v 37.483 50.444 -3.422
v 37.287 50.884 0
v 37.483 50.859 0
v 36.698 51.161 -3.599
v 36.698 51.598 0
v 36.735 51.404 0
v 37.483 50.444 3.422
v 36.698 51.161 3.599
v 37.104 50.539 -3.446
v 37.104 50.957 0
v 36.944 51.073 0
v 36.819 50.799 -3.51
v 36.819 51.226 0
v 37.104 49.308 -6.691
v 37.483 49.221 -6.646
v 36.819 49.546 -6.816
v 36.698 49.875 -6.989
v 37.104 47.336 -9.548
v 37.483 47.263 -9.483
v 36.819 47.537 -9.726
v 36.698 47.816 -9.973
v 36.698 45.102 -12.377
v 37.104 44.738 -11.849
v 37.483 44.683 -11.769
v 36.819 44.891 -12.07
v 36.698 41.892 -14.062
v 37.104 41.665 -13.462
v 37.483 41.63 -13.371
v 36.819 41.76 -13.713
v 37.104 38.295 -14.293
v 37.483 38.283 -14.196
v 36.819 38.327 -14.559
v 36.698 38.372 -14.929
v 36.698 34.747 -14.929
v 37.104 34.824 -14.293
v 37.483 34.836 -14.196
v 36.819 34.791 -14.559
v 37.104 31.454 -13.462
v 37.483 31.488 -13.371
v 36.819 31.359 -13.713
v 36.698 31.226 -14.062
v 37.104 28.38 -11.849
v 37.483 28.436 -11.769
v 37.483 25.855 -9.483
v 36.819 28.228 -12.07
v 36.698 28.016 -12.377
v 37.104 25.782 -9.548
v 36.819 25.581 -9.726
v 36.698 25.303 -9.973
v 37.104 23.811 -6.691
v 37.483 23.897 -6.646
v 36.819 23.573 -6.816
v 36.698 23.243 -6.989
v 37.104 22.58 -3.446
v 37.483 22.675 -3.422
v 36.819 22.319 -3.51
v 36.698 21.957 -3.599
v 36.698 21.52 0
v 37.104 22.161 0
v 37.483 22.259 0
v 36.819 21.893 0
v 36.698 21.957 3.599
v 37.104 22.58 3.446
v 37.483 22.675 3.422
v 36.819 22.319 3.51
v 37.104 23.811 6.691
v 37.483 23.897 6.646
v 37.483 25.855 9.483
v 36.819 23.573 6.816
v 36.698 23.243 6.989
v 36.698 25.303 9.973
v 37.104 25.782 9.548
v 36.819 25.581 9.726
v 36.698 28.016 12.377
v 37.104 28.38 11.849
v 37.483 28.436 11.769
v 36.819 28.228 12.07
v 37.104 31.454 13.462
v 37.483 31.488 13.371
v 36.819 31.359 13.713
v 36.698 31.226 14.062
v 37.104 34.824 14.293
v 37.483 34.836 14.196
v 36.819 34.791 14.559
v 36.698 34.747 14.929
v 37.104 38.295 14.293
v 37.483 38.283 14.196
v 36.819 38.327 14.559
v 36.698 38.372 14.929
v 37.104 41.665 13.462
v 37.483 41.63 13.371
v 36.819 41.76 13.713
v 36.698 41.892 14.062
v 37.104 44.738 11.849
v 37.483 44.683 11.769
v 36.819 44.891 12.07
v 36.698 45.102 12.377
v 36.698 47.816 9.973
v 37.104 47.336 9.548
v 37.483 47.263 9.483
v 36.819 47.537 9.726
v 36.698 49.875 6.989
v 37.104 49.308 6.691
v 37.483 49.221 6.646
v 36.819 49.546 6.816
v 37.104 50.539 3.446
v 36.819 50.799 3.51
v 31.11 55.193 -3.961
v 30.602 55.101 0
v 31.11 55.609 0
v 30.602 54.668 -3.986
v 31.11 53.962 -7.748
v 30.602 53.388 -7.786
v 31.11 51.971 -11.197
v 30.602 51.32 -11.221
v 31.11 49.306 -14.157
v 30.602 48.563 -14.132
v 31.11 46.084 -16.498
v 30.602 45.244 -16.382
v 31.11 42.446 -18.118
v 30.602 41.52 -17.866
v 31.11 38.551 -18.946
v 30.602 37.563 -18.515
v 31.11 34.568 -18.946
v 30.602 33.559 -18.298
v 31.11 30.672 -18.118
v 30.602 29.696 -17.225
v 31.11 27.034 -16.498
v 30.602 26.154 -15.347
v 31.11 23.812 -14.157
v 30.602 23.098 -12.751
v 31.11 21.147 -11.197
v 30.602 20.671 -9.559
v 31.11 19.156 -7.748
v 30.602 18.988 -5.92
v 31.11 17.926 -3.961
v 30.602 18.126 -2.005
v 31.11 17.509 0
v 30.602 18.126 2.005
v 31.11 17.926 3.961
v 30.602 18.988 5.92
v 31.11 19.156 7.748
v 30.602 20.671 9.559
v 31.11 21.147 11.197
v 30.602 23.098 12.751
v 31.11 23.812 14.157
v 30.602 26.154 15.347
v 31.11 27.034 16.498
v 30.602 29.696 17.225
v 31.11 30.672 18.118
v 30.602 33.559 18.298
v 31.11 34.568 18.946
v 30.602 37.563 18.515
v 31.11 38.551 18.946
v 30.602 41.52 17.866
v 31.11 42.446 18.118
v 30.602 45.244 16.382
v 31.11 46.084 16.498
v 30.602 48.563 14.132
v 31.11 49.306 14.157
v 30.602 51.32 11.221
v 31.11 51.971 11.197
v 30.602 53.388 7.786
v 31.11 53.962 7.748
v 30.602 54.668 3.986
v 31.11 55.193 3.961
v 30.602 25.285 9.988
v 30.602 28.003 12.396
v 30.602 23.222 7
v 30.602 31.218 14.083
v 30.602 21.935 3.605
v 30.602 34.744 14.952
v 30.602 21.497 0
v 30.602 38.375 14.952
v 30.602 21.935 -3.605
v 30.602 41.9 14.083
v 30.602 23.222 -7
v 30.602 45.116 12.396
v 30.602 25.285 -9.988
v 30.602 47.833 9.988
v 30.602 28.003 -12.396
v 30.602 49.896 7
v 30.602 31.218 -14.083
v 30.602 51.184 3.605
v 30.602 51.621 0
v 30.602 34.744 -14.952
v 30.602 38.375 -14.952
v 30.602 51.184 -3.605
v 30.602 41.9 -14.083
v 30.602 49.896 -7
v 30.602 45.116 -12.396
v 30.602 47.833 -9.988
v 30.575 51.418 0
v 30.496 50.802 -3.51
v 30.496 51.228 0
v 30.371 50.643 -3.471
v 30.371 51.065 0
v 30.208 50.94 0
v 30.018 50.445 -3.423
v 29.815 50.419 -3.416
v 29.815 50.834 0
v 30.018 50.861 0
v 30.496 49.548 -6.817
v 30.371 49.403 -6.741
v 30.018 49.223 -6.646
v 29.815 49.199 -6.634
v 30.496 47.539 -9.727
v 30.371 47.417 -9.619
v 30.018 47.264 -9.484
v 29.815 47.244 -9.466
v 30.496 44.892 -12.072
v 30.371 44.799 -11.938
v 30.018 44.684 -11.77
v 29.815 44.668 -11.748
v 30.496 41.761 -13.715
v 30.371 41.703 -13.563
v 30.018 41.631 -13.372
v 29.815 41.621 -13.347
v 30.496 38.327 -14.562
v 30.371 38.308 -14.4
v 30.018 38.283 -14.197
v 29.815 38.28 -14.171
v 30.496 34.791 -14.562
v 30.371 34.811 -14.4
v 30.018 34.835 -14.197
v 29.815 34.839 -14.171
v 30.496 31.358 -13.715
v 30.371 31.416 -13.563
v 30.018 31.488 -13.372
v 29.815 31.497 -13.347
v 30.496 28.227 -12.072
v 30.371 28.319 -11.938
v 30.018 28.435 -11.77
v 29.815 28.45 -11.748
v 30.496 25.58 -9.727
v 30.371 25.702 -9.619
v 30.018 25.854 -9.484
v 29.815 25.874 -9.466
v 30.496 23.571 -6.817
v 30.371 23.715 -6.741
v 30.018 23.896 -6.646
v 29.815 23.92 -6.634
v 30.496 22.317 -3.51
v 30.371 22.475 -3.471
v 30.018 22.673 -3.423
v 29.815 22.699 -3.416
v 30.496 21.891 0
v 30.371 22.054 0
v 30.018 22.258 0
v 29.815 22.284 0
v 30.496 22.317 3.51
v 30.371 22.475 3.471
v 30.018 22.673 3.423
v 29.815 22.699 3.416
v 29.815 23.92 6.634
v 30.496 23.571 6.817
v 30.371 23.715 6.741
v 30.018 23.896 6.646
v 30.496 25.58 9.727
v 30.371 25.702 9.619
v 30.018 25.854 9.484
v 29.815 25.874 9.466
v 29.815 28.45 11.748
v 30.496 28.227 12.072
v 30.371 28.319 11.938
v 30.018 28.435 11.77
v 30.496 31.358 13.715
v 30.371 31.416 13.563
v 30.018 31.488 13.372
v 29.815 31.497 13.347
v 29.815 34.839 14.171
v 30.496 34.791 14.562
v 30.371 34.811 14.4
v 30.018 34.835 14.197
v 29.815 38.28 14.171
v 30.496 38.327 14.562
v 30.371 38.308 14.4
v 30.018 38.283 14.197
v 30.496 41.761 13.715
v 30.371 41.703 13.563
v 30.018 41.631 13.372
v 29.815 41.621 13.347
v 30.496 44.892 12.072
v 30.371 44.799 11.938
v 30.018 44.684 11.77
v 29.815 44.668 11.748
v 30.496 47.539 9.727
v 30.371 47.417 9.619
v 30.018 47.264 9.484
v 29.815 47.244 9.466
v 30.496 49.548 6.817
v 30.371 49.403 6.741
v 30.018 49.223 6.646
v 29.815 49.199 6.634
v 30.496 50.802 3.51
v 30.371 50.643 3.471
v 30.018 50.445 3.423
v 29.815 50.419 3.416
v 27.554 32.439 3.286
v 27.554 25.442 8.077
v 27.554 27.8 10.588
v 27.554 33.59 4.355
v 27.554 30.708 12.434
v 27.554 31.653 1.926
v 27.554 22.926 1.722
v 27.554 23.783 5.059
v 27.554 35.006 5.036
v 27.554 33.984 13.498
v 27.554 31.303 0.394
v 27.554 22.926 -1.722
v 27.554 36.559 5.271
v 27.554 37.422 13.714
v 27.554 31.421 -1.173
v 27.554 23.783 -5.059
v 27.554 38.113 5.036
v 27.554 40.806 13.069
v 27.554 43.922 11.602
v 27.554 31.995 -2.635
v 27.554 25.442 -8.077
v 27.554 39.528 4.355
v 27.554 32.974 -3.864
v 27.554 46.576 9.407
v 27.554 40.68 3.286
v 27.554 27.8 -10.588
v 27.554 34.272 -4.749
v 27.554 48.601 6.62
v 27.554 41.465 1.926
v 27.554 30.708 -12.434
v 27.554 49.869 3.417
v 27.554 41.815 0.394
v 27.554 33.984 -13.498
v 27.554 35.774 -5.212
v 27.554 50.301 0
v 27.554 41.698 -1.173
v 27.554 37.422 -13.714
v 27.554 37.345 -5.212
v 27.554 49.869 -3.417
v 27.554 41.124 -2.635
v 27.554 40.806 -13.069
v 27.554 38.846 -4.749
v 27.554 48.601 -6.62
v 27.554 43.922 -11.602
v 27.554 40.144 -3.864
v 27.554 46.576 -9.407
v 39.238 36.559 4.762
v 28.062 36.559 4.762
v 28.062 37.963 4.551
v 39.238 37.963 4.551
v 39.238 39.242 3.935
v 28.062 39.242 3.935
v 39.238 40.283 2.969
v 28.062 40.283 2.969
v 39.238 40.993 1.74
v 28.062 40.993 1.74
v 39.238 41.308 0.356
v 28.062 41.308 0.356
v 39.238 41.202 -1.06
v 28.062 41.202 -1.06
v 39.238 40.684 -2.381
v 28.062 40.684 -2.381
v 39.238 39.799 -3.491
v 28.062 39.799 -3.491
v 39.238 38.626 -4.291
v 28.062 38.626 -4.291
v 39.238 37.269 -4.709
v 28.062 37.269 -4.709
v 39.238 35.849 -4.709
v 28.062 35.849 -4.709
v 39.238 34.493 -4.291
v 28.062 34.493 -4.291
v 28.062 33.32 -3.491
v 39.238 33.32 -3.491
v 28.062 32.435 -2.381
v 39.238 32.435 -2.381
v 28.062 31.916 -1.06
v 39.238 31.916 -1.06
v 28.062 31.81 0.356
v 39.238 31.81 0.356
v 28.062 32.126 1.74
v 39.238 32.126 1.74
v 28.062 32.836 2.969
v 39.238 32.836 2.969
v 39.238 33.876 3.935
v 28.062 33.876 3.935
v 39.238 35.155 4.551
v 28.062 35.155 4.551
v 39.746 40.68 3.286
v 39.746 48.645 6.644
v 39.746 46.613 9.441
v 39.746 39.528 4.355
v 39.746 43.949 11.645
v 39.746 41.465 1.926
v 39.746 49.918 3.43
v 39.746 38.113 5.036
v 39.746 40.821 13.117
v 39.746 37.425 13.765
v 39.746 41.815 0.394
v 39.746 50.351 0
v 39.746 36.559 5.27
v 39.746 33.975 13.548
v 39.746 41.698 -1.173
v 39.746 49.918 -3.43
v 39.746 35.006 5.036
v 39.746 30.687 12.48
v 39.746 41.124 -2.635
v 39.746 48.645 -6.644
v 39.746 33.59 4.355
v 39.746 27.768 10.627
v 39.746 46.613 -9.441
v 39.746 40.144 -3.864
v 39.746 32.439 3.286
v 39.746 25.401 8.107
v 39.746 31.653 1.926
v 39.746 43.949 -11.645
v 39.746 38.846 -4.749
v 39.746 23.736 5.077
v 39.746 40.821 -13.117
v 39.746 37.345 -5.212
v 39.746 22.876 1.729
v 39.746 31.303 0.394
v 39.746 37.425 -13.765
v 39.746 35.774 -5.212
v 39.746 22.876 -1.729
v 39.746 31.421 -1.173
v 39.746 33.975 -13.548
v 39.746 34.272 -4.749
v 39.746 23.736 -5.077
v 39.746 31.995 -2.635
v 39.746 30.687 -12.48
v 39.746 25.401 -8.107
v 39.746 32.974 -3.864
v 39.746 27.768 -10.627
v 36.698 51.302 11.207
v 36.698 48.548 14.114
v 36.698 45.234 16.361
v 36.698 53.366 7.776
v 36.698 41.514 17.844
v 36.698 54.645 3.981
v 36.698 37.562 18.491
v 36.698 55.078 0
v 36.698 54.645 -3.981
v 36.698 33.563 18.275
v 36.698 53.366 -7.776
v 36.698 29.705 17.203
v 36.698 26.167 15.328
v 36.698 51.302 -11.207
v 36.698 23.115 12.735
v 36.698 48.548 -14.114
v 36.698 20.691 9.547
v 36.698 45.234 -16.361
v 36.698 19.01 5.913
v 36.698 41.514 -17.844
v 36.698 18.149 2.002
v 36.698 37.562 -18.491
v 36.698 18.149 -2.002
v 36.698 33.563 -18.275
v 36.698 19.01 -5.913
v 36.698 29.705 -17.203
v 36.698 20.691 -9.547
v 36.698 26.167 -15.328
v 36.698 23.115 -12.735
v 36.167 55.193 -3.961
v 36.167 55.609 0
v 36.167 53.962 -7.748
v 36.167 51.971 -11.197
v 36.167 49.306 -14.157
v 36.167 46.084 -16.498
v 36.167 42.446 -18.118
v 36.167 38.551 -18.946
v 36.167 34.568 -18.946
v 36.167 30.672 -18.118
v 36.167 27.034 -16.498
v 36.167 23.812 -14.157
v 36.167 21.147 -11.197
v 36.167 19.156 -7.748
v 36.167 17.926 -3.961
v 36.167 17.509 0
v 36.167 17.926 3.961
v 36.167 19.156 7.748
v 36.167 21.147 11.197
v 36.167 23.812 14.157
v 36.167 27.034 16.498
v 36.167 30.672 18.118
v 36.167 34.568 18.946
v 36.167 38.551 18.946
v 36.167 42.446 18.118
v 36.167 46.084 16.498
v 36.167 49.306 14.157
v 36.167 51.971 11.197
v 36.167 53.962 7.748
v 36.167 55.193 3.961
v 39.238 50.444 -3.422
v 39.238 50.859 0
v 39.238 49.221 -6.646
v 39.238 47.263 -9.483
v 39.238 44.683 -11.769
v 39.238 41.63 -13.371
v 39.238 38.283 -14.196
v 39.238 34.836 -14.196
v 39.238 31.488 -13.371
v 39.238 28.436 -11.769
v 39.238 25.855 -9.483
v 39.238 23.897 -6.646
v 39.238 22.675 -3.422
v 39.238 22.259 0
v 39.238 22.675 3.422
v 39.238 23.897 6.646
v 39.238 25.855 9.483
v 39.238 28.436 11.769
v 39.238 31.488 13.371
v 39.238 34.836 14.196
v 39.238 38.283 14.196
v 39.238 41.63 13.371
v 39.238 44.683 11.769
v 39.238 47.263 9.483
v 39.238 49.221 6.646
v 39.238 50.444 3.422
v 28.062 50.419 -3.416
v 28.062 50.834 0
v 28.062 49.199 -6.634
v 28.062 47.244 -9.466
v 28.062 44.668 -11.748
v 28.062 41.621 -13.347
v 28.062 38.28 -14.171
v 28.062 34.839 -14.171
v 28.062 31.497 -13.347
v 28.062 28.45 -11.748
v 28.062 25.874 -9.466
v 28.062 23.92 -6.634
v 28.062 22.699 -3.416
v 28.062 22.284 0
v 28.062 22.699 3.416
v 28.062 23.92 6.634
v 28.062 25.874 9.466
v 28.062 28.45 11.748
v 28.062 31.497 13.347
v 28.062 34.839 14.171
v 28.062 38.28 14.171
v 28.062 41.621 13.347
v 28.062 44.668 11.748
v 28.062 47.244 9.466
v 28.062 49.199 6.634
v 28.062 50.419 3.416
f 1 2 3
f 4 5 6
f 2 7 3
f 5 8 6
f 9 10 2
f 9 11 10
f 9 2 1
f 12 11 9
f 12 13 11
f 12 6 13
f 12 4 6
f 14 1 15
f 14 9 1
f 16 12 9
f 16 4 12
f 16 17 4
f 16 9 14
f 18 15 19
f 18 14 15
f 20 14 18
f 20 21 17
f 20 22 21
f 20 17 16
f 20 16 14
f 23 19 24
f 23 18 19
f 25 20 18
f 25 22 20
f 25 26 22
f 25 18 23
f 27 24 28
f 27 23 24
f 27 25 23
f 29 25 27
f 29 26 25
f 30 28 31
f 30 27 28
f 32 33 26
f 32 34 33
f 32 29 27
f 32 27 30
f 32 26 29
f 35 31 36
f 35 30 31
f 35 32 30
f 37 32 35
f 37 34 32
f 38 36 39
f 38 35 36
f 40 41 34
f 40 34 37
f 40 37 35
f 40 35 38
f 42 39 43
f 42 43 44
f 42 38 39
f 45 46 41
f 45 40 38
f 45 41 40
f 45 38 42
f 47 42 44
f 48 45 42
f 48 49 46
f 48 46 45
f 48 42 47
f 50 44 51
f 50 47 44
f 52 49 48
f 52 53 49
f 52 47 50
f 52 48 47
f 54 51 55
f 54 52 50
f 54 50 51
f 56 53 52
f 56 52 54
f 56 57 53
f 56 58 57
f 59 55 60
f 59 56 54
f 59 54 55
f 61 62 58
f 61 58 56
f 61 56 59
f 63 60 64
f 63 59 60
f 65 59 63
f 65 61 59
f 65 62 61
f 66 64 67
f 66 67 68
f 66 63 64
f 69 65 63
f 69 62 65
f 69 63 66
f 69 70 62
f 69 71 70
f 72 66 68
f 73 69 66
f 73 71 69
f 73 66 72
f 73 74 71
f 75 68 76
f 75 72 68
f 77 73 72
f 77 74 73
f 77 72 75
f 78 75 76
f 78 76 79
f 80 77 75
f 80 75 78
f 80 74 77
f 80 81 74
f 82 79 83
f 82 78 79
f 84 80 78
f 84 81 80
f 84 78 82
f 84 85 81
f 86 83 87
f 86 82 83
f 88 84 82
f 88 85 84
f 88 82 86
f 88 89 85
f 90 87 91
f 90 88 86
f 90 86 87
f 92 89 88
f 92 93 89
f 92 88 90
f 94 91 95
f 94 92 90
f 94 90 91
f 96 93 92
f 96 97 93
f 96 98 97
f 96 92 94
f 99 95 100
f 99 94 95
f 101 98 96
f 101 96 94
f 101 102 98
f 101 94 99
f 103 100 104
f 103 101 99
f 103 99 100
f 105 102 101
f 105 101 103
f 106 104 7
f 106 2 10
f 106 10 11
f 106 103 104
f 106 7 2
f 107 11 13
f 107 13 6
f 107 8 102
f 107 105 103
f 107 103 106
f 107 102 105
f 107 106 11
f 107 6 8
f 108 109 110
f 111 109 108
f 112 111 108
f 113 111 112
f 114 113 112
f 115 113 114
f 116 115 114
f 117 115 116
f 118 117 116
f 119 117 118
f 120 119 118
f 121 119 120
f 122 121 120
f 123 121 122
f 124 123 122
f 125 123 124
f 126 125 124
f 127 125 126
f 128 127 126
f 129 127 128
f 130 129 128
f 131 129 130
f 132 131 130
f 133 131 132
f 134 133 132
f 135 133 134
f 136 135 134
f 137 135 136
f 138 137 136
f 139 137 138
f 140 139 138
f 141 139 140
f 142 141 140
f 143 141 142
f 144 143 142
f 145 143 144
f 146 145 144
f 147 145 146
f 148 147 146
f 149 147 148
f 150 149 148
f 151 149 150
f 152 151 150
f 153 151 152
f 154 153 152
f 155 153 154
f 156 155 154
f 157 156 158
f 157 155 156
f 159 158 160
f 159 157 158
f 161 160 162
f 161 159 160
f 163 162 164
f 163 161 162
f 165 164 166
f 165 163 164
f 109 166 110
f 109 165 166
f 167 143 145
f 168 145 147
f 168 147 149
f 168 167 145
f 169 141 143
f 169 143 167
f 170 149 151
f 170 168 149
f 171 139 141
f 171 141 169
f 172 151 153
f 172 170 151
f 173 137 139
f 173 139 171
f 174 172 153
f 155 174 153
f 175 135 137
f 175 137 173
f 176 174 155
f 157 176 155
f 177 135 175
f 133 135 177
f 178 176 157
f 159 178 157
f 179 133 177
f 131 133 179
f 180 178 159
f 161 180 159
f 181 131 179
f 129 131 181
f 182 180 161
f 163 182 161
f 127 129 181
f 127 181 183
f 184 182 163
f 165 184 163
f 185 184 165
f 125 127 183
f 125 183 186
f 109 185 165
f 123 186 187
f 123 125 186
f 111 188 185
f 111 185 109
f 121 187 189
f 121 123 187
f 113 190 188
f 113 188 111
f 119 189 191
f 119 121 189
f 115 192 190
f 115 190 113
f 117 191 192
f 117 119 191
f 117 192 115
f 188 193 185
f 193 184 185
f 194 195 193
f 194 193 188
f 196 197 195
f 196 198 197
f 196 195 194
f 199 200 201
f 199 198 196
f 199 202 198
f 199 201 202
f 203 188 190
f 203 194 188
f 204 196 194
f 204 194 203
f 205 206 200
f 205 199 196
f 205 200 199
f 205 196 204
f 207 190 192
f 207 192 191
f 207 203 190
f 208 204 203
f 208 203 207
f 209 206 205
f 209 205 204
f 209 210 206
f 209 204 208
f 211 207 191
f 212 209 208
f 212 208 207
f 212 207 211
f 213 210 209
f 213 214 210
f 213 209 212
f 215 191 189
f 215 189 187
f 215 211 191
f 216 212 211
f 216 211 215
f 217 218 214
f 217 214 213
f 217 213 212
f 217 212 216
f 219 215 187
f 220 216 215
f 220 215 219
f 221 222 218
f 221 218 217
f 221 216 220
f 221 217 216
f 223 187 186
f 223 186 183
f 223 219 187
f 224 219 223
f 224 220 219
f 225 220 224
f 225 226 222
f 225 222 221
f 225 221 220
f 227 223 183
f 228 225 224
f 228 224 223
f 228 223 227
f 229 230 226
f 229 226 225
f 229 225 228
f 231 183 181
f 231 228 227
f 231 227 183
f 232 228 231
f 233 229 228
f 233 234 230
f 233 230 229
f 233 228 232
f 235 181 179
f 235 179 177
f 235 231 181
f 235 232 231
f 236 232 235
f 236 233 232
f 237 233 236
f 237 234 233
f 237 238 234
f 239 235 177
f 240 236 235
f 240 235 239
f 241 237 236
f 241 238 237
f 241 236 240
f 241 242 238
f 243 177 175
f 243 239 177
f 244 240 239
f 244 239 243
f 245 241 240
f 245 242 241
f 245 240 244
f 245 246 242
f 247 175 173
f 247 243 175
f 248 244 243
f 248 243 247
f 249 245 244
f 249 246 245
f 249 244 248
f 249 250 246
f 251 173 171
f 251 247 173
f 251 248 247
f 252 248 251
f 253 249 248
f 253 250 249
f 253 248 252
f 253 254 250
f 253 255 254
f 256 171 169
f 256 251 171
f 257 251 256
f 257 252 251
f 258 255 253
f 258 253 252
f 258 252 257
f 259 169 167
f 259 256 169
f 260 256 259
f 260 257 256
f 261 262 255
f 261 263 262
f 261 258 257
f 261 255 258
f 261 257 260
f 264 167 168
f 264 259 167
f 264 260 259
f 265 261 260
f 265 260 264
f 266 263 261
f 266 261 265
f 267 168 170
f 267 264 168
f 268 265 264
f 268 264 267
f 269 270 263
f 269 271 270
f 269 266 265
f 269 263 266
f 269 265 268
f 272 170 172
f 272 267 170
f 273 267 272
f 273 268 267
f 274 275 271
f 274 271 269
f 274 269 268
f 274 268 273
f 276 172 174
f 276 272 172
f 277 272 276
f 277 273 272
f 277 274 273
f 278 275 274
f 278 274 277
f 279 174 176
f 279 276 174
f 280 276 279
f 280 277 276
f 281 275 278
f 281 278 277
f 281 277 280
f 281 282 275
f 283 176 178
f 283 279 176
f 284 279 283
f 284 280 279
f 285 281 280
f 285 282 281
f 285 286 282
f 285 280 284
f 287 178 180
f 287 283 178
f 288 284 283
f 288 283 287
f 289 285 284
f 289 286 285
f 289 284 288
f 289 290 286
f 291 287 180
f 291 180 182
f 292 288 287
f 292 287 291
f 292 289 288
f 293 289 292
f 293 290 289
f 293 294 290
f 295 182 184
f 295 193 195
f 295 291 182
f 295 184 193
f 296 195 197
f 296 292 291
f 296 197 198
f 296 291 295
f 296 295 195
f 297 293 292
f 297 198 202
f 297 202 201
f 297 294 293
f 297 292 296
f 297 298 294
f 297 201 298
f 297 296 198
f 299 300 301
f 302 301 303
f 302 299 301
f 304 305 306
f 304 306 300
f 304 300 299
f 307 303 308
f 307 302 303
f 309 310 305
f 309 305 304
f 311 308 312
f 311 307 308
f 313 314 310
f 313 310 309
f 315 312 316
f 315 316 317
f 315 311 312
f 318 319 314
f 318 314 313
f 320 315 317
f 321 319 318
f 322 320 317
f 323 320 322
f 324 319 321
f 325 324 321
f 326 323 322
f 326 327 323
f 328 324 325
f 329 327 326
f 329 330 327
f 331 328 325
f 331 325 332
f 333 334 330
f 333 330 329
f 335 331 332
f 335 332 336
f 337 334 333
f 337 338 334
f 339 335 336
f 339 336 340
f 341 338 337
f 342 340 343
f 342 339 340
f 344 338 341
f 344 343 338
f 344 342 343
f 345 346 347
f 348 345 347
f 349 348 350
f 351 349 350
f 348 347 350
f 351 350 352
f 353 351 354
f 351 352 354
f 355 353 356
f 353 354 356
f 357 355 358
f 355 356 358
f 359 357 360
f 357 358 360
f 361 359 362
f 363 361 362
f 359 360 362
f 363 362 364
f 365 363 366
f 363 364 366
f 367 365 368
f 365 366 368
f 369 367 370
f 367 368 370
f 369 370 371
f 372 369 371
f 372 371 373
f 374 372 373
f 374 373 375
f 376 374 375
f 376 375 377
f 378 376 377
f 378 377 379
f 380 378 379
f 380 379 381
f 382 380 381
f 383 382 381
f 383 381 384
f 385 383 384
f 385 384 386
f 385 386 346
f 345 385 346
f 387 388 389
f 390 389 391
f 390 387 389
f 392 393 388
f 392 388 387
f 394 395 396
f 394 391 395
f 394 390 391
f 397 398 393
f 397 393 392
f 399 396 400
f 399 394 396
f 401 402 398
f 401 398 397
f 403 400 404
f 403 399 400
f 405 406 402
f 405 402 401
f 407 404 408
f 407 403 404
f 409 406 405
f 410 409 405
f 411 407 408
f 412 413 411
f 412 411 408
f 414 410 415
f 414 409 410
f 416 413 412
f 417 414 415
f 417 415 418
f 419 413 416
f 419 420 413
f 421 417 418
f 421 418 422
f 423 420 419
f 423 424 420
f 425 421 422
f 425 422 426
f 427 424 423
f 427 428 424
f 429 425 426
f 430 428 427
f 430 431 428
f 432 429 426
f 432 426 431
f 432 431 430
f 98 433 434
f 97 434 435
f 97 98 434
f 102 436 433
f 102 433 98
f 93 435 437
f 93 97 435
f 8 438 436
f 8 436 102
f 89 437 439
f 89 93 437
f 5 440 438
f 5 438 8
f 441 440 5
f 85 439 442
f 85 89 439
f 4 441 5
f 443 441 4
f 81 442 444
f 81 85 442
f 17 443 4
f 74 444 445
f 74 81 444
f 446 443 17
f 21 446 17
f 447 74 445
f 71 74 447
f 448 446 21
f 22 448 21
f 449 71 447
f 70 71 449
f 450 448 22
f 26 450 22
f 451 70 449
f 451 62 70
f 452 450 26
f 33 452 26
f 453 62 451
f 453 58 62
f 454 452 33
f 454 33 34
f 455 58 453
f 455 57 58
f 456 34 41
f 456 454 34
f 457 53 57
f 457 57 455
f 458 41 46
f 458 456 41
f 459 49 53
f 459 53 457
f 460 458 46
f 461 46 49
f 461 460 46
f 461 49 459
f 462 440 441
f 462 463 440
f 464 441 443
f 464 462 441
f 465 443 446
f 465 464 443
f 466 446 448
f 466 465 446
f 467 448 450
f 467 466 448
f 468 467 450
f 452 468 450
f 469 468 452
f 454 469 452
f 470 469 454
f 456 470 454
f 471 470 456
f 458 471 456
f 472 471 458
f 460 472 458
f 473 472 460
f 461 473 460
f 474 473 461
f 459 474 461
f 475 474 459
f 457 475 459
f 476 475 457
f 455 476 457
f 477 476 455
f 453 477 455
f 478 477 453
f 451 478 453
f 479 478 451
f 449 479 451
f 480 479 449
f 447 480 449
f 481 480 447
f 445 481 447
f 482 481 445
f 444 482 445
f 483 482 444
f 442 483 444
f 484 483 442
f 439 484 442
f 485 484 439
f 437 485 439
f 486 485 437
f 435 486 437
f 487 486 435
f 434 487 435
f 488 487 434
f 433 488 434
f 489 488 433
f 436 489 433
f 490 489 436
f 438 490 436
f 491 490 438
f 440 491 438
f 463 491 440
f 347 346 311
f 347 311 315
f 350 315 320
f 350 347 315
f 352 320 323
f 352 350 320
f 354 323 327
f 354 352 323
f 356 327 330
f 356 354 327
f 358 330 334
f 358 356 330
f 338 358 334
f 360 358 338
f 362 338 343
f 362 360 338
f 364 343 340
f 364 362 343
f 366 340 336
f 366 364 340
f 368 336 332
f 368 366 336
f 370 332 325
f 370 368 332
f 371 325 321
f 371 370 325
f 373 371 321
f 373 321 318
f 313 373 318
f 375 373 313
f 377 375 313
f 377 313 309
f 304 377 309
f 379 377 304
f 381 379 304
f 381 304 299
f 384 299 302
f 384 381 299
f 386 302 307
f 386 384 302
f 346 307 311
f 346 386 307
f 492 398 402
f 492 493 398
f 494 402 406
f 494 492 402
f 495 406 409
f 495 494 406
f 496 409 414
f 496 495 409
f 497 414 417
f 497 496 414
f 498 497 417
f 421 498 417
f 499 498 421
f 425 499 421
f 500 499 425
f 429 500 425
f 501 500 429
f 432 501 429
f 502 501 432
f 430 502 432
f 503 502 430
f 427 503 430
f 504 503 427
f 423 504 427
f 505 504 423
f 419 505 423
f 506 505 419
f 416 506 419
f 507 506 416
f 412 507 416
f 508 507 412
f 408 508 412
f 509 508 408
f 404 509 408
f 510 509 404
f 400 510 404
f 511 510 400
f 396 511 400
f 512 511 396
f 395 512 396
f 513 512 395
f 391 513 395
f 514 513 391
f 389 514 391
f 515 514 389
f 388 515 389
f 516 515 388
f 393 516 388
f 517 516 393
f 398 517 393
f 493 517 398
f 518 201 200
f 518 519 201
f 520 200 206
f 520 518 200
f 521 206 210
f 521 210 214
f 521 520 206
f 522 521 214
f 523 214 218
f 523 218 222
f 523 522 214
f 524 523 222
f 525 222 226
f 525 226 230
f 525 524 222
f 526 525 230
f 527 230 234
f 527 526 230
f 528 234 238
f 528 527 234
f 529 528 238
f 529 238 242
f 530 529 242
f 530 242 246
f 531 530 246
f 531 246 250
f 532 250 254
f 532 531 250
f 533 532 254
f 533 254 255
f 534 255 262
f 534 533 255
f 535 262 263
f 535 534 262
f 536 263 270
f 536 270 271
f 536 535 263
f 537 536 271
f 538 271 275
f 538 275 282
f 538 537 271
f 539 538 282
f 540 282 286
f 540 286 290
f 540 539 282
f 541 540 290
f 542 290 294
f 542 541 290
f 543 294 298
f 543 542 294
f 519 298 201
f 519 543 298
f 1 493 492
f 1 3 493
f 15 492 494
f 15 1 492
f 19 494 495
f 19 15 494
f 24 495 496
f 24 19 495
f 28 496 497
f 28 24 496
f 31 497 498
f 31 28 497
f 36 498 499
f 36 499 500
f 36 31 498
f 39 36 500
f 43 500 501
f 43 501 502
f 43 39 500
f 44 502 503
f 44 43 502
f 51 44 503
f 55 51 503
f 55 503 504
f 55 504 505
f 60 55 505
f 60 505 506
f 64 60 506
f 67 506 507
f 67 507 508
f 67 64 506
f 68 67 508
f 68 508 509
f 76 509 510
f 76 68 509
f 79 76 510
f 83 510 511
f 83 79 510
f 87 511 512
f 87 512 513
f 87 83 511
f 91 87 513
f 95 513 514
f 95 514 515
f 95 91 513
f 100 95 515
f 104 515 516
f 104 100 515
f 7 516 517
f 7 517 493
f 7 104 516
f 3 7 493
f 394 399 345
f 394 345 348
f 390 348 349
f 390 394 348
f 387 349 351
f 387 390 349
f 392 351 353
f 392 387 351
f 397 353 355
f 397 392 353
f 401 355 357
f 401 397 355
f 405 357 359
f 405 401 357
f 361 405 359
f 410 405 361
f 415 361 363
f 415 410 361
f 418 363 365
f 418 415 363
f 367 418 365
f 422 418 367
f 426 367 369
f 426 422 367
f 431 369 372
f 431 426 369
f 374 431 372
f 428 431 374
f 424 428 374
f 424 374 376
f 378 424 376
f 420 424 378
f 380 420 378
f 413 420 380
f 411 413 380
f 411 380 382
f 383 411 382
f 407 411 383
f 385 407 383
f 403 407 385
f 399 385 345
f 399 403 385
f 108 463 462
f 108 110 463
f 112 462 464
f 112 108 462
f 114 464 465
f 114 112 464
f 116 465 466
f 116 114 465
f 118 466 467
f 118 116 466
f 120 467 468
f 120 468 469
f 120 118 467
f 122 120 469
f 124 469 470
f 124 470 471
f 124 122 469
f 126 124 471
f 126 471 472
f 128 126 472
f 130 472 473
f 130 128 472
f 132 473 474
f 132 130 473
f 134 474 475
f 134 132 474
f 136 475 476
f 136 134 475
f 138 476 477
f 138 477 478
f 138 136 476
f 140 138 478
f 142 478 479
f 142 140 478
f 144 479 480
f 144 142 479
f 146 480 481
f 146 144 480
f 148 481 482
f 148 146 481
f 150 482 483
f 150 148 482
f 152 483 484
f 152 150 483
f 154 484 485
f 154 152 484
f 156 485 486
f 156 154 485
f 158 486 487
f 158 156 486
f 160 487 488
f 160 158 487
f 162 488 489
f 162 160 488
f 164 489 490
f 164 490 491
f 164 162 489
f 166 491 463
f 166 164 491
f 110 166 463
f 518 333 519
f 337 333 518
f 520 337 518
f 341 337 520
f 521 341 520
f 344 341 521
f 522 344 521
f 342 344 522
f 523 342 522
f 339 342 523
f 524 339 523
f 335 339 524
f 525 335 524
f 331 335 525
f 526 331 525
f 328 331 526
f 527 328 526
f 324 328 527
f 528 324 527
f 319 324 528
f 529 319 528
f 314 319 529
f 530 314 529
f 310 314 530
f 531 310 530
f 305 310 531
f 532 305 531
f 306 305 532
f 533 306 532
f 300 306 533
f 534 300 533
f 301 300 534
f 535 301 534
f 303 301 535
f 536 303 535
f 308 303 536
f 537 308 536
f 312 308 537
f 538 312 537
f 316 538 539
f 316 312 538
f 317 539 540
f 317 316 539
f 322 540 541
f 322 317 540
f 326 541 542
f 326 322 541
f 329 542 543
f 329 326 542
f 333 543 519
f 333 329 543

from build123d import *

# Parameters (mm, degrees)
SKETCH3_R          = 4.7625
CUT_EXTRUDE1_DEPTH = 13.192
CHAMFER1_SIZE      = 0.508


with BuildPart() as part:
    # Sketch2 → Revolve1 (revolve)
    with BuildSketch(Plane.XY):
        with BuildLine():
            Line((27.553988289, 50.300658572), (27.553988289, 36.559258572))
            Line((27.553988289, 36.559258572), (33.638296362, 36.559258572))
            Line((33.638296362, 36.559258572), (39.745988289, 36.571958572))
            Line((39.745988289, 36.571958572), (39.745988289, 50.351458572))
            Line((39.745988289, 50.351458572), (39.237988289, 50.859458572))
            Line((39.237988289, 50.859458572), (37.483216953, 50.859458572))
            ThreePointArc((37.483216953, 50.859458572), (36.944383174, 51.073319594), (36.697988289, 51.598074717))
            Line((36.697988289, 51.598074717), (36.697988289, 55.077874717))
            Line((36.697988289, 55.077874717), (36.166604435, 55.609258572))
            Line((36.166604435, 55.609258572), (31.109988289, 55.609258572))
            Line((31.109988289, 55.609258572), (30.601988289, 55.101258572))
            Line((30.601988289, 55.101258572), (30.601988289, 51.621458572))
            ThreePointArc((30.601988289, 51.621458572), (30.371364168, 51.064682692), (29.814588289, 50.834058572))
            Line((29.814588289, 50.834058572), (28.061988289, 50.834058572))
            Line((28.061988289, 50.834058572), (27.553988289, 50.300658572))
        make_face()
    revolve(axis=Axis((33.638296362, 36.559258572, 0), (-1, 0, 0)))

    # Sketch3 → Cut-Extrude1 (cut, through all)
    with BuildSketch(Plane.ZY.offset(-27.553988289)):
        with Locations((0, 36.559258572)):
            Circle(SKETCH3_R)
    extrude(amount=-CUT_EXTRUDE1_DEPTH, mode=Mode.SUBTRACT)

    # Chamfer1
    chamfer1_edges = [part.edges().sort_by_distance(p)[0] for p in [
        (39.745988289, 36.559258572, -4.7625),
        (27.553988289, 36.559258572, -4.7625),
    ]]
    chamfer(chamfer1_edges, length=CHAMFER1_SIZE)


solid = part.part
